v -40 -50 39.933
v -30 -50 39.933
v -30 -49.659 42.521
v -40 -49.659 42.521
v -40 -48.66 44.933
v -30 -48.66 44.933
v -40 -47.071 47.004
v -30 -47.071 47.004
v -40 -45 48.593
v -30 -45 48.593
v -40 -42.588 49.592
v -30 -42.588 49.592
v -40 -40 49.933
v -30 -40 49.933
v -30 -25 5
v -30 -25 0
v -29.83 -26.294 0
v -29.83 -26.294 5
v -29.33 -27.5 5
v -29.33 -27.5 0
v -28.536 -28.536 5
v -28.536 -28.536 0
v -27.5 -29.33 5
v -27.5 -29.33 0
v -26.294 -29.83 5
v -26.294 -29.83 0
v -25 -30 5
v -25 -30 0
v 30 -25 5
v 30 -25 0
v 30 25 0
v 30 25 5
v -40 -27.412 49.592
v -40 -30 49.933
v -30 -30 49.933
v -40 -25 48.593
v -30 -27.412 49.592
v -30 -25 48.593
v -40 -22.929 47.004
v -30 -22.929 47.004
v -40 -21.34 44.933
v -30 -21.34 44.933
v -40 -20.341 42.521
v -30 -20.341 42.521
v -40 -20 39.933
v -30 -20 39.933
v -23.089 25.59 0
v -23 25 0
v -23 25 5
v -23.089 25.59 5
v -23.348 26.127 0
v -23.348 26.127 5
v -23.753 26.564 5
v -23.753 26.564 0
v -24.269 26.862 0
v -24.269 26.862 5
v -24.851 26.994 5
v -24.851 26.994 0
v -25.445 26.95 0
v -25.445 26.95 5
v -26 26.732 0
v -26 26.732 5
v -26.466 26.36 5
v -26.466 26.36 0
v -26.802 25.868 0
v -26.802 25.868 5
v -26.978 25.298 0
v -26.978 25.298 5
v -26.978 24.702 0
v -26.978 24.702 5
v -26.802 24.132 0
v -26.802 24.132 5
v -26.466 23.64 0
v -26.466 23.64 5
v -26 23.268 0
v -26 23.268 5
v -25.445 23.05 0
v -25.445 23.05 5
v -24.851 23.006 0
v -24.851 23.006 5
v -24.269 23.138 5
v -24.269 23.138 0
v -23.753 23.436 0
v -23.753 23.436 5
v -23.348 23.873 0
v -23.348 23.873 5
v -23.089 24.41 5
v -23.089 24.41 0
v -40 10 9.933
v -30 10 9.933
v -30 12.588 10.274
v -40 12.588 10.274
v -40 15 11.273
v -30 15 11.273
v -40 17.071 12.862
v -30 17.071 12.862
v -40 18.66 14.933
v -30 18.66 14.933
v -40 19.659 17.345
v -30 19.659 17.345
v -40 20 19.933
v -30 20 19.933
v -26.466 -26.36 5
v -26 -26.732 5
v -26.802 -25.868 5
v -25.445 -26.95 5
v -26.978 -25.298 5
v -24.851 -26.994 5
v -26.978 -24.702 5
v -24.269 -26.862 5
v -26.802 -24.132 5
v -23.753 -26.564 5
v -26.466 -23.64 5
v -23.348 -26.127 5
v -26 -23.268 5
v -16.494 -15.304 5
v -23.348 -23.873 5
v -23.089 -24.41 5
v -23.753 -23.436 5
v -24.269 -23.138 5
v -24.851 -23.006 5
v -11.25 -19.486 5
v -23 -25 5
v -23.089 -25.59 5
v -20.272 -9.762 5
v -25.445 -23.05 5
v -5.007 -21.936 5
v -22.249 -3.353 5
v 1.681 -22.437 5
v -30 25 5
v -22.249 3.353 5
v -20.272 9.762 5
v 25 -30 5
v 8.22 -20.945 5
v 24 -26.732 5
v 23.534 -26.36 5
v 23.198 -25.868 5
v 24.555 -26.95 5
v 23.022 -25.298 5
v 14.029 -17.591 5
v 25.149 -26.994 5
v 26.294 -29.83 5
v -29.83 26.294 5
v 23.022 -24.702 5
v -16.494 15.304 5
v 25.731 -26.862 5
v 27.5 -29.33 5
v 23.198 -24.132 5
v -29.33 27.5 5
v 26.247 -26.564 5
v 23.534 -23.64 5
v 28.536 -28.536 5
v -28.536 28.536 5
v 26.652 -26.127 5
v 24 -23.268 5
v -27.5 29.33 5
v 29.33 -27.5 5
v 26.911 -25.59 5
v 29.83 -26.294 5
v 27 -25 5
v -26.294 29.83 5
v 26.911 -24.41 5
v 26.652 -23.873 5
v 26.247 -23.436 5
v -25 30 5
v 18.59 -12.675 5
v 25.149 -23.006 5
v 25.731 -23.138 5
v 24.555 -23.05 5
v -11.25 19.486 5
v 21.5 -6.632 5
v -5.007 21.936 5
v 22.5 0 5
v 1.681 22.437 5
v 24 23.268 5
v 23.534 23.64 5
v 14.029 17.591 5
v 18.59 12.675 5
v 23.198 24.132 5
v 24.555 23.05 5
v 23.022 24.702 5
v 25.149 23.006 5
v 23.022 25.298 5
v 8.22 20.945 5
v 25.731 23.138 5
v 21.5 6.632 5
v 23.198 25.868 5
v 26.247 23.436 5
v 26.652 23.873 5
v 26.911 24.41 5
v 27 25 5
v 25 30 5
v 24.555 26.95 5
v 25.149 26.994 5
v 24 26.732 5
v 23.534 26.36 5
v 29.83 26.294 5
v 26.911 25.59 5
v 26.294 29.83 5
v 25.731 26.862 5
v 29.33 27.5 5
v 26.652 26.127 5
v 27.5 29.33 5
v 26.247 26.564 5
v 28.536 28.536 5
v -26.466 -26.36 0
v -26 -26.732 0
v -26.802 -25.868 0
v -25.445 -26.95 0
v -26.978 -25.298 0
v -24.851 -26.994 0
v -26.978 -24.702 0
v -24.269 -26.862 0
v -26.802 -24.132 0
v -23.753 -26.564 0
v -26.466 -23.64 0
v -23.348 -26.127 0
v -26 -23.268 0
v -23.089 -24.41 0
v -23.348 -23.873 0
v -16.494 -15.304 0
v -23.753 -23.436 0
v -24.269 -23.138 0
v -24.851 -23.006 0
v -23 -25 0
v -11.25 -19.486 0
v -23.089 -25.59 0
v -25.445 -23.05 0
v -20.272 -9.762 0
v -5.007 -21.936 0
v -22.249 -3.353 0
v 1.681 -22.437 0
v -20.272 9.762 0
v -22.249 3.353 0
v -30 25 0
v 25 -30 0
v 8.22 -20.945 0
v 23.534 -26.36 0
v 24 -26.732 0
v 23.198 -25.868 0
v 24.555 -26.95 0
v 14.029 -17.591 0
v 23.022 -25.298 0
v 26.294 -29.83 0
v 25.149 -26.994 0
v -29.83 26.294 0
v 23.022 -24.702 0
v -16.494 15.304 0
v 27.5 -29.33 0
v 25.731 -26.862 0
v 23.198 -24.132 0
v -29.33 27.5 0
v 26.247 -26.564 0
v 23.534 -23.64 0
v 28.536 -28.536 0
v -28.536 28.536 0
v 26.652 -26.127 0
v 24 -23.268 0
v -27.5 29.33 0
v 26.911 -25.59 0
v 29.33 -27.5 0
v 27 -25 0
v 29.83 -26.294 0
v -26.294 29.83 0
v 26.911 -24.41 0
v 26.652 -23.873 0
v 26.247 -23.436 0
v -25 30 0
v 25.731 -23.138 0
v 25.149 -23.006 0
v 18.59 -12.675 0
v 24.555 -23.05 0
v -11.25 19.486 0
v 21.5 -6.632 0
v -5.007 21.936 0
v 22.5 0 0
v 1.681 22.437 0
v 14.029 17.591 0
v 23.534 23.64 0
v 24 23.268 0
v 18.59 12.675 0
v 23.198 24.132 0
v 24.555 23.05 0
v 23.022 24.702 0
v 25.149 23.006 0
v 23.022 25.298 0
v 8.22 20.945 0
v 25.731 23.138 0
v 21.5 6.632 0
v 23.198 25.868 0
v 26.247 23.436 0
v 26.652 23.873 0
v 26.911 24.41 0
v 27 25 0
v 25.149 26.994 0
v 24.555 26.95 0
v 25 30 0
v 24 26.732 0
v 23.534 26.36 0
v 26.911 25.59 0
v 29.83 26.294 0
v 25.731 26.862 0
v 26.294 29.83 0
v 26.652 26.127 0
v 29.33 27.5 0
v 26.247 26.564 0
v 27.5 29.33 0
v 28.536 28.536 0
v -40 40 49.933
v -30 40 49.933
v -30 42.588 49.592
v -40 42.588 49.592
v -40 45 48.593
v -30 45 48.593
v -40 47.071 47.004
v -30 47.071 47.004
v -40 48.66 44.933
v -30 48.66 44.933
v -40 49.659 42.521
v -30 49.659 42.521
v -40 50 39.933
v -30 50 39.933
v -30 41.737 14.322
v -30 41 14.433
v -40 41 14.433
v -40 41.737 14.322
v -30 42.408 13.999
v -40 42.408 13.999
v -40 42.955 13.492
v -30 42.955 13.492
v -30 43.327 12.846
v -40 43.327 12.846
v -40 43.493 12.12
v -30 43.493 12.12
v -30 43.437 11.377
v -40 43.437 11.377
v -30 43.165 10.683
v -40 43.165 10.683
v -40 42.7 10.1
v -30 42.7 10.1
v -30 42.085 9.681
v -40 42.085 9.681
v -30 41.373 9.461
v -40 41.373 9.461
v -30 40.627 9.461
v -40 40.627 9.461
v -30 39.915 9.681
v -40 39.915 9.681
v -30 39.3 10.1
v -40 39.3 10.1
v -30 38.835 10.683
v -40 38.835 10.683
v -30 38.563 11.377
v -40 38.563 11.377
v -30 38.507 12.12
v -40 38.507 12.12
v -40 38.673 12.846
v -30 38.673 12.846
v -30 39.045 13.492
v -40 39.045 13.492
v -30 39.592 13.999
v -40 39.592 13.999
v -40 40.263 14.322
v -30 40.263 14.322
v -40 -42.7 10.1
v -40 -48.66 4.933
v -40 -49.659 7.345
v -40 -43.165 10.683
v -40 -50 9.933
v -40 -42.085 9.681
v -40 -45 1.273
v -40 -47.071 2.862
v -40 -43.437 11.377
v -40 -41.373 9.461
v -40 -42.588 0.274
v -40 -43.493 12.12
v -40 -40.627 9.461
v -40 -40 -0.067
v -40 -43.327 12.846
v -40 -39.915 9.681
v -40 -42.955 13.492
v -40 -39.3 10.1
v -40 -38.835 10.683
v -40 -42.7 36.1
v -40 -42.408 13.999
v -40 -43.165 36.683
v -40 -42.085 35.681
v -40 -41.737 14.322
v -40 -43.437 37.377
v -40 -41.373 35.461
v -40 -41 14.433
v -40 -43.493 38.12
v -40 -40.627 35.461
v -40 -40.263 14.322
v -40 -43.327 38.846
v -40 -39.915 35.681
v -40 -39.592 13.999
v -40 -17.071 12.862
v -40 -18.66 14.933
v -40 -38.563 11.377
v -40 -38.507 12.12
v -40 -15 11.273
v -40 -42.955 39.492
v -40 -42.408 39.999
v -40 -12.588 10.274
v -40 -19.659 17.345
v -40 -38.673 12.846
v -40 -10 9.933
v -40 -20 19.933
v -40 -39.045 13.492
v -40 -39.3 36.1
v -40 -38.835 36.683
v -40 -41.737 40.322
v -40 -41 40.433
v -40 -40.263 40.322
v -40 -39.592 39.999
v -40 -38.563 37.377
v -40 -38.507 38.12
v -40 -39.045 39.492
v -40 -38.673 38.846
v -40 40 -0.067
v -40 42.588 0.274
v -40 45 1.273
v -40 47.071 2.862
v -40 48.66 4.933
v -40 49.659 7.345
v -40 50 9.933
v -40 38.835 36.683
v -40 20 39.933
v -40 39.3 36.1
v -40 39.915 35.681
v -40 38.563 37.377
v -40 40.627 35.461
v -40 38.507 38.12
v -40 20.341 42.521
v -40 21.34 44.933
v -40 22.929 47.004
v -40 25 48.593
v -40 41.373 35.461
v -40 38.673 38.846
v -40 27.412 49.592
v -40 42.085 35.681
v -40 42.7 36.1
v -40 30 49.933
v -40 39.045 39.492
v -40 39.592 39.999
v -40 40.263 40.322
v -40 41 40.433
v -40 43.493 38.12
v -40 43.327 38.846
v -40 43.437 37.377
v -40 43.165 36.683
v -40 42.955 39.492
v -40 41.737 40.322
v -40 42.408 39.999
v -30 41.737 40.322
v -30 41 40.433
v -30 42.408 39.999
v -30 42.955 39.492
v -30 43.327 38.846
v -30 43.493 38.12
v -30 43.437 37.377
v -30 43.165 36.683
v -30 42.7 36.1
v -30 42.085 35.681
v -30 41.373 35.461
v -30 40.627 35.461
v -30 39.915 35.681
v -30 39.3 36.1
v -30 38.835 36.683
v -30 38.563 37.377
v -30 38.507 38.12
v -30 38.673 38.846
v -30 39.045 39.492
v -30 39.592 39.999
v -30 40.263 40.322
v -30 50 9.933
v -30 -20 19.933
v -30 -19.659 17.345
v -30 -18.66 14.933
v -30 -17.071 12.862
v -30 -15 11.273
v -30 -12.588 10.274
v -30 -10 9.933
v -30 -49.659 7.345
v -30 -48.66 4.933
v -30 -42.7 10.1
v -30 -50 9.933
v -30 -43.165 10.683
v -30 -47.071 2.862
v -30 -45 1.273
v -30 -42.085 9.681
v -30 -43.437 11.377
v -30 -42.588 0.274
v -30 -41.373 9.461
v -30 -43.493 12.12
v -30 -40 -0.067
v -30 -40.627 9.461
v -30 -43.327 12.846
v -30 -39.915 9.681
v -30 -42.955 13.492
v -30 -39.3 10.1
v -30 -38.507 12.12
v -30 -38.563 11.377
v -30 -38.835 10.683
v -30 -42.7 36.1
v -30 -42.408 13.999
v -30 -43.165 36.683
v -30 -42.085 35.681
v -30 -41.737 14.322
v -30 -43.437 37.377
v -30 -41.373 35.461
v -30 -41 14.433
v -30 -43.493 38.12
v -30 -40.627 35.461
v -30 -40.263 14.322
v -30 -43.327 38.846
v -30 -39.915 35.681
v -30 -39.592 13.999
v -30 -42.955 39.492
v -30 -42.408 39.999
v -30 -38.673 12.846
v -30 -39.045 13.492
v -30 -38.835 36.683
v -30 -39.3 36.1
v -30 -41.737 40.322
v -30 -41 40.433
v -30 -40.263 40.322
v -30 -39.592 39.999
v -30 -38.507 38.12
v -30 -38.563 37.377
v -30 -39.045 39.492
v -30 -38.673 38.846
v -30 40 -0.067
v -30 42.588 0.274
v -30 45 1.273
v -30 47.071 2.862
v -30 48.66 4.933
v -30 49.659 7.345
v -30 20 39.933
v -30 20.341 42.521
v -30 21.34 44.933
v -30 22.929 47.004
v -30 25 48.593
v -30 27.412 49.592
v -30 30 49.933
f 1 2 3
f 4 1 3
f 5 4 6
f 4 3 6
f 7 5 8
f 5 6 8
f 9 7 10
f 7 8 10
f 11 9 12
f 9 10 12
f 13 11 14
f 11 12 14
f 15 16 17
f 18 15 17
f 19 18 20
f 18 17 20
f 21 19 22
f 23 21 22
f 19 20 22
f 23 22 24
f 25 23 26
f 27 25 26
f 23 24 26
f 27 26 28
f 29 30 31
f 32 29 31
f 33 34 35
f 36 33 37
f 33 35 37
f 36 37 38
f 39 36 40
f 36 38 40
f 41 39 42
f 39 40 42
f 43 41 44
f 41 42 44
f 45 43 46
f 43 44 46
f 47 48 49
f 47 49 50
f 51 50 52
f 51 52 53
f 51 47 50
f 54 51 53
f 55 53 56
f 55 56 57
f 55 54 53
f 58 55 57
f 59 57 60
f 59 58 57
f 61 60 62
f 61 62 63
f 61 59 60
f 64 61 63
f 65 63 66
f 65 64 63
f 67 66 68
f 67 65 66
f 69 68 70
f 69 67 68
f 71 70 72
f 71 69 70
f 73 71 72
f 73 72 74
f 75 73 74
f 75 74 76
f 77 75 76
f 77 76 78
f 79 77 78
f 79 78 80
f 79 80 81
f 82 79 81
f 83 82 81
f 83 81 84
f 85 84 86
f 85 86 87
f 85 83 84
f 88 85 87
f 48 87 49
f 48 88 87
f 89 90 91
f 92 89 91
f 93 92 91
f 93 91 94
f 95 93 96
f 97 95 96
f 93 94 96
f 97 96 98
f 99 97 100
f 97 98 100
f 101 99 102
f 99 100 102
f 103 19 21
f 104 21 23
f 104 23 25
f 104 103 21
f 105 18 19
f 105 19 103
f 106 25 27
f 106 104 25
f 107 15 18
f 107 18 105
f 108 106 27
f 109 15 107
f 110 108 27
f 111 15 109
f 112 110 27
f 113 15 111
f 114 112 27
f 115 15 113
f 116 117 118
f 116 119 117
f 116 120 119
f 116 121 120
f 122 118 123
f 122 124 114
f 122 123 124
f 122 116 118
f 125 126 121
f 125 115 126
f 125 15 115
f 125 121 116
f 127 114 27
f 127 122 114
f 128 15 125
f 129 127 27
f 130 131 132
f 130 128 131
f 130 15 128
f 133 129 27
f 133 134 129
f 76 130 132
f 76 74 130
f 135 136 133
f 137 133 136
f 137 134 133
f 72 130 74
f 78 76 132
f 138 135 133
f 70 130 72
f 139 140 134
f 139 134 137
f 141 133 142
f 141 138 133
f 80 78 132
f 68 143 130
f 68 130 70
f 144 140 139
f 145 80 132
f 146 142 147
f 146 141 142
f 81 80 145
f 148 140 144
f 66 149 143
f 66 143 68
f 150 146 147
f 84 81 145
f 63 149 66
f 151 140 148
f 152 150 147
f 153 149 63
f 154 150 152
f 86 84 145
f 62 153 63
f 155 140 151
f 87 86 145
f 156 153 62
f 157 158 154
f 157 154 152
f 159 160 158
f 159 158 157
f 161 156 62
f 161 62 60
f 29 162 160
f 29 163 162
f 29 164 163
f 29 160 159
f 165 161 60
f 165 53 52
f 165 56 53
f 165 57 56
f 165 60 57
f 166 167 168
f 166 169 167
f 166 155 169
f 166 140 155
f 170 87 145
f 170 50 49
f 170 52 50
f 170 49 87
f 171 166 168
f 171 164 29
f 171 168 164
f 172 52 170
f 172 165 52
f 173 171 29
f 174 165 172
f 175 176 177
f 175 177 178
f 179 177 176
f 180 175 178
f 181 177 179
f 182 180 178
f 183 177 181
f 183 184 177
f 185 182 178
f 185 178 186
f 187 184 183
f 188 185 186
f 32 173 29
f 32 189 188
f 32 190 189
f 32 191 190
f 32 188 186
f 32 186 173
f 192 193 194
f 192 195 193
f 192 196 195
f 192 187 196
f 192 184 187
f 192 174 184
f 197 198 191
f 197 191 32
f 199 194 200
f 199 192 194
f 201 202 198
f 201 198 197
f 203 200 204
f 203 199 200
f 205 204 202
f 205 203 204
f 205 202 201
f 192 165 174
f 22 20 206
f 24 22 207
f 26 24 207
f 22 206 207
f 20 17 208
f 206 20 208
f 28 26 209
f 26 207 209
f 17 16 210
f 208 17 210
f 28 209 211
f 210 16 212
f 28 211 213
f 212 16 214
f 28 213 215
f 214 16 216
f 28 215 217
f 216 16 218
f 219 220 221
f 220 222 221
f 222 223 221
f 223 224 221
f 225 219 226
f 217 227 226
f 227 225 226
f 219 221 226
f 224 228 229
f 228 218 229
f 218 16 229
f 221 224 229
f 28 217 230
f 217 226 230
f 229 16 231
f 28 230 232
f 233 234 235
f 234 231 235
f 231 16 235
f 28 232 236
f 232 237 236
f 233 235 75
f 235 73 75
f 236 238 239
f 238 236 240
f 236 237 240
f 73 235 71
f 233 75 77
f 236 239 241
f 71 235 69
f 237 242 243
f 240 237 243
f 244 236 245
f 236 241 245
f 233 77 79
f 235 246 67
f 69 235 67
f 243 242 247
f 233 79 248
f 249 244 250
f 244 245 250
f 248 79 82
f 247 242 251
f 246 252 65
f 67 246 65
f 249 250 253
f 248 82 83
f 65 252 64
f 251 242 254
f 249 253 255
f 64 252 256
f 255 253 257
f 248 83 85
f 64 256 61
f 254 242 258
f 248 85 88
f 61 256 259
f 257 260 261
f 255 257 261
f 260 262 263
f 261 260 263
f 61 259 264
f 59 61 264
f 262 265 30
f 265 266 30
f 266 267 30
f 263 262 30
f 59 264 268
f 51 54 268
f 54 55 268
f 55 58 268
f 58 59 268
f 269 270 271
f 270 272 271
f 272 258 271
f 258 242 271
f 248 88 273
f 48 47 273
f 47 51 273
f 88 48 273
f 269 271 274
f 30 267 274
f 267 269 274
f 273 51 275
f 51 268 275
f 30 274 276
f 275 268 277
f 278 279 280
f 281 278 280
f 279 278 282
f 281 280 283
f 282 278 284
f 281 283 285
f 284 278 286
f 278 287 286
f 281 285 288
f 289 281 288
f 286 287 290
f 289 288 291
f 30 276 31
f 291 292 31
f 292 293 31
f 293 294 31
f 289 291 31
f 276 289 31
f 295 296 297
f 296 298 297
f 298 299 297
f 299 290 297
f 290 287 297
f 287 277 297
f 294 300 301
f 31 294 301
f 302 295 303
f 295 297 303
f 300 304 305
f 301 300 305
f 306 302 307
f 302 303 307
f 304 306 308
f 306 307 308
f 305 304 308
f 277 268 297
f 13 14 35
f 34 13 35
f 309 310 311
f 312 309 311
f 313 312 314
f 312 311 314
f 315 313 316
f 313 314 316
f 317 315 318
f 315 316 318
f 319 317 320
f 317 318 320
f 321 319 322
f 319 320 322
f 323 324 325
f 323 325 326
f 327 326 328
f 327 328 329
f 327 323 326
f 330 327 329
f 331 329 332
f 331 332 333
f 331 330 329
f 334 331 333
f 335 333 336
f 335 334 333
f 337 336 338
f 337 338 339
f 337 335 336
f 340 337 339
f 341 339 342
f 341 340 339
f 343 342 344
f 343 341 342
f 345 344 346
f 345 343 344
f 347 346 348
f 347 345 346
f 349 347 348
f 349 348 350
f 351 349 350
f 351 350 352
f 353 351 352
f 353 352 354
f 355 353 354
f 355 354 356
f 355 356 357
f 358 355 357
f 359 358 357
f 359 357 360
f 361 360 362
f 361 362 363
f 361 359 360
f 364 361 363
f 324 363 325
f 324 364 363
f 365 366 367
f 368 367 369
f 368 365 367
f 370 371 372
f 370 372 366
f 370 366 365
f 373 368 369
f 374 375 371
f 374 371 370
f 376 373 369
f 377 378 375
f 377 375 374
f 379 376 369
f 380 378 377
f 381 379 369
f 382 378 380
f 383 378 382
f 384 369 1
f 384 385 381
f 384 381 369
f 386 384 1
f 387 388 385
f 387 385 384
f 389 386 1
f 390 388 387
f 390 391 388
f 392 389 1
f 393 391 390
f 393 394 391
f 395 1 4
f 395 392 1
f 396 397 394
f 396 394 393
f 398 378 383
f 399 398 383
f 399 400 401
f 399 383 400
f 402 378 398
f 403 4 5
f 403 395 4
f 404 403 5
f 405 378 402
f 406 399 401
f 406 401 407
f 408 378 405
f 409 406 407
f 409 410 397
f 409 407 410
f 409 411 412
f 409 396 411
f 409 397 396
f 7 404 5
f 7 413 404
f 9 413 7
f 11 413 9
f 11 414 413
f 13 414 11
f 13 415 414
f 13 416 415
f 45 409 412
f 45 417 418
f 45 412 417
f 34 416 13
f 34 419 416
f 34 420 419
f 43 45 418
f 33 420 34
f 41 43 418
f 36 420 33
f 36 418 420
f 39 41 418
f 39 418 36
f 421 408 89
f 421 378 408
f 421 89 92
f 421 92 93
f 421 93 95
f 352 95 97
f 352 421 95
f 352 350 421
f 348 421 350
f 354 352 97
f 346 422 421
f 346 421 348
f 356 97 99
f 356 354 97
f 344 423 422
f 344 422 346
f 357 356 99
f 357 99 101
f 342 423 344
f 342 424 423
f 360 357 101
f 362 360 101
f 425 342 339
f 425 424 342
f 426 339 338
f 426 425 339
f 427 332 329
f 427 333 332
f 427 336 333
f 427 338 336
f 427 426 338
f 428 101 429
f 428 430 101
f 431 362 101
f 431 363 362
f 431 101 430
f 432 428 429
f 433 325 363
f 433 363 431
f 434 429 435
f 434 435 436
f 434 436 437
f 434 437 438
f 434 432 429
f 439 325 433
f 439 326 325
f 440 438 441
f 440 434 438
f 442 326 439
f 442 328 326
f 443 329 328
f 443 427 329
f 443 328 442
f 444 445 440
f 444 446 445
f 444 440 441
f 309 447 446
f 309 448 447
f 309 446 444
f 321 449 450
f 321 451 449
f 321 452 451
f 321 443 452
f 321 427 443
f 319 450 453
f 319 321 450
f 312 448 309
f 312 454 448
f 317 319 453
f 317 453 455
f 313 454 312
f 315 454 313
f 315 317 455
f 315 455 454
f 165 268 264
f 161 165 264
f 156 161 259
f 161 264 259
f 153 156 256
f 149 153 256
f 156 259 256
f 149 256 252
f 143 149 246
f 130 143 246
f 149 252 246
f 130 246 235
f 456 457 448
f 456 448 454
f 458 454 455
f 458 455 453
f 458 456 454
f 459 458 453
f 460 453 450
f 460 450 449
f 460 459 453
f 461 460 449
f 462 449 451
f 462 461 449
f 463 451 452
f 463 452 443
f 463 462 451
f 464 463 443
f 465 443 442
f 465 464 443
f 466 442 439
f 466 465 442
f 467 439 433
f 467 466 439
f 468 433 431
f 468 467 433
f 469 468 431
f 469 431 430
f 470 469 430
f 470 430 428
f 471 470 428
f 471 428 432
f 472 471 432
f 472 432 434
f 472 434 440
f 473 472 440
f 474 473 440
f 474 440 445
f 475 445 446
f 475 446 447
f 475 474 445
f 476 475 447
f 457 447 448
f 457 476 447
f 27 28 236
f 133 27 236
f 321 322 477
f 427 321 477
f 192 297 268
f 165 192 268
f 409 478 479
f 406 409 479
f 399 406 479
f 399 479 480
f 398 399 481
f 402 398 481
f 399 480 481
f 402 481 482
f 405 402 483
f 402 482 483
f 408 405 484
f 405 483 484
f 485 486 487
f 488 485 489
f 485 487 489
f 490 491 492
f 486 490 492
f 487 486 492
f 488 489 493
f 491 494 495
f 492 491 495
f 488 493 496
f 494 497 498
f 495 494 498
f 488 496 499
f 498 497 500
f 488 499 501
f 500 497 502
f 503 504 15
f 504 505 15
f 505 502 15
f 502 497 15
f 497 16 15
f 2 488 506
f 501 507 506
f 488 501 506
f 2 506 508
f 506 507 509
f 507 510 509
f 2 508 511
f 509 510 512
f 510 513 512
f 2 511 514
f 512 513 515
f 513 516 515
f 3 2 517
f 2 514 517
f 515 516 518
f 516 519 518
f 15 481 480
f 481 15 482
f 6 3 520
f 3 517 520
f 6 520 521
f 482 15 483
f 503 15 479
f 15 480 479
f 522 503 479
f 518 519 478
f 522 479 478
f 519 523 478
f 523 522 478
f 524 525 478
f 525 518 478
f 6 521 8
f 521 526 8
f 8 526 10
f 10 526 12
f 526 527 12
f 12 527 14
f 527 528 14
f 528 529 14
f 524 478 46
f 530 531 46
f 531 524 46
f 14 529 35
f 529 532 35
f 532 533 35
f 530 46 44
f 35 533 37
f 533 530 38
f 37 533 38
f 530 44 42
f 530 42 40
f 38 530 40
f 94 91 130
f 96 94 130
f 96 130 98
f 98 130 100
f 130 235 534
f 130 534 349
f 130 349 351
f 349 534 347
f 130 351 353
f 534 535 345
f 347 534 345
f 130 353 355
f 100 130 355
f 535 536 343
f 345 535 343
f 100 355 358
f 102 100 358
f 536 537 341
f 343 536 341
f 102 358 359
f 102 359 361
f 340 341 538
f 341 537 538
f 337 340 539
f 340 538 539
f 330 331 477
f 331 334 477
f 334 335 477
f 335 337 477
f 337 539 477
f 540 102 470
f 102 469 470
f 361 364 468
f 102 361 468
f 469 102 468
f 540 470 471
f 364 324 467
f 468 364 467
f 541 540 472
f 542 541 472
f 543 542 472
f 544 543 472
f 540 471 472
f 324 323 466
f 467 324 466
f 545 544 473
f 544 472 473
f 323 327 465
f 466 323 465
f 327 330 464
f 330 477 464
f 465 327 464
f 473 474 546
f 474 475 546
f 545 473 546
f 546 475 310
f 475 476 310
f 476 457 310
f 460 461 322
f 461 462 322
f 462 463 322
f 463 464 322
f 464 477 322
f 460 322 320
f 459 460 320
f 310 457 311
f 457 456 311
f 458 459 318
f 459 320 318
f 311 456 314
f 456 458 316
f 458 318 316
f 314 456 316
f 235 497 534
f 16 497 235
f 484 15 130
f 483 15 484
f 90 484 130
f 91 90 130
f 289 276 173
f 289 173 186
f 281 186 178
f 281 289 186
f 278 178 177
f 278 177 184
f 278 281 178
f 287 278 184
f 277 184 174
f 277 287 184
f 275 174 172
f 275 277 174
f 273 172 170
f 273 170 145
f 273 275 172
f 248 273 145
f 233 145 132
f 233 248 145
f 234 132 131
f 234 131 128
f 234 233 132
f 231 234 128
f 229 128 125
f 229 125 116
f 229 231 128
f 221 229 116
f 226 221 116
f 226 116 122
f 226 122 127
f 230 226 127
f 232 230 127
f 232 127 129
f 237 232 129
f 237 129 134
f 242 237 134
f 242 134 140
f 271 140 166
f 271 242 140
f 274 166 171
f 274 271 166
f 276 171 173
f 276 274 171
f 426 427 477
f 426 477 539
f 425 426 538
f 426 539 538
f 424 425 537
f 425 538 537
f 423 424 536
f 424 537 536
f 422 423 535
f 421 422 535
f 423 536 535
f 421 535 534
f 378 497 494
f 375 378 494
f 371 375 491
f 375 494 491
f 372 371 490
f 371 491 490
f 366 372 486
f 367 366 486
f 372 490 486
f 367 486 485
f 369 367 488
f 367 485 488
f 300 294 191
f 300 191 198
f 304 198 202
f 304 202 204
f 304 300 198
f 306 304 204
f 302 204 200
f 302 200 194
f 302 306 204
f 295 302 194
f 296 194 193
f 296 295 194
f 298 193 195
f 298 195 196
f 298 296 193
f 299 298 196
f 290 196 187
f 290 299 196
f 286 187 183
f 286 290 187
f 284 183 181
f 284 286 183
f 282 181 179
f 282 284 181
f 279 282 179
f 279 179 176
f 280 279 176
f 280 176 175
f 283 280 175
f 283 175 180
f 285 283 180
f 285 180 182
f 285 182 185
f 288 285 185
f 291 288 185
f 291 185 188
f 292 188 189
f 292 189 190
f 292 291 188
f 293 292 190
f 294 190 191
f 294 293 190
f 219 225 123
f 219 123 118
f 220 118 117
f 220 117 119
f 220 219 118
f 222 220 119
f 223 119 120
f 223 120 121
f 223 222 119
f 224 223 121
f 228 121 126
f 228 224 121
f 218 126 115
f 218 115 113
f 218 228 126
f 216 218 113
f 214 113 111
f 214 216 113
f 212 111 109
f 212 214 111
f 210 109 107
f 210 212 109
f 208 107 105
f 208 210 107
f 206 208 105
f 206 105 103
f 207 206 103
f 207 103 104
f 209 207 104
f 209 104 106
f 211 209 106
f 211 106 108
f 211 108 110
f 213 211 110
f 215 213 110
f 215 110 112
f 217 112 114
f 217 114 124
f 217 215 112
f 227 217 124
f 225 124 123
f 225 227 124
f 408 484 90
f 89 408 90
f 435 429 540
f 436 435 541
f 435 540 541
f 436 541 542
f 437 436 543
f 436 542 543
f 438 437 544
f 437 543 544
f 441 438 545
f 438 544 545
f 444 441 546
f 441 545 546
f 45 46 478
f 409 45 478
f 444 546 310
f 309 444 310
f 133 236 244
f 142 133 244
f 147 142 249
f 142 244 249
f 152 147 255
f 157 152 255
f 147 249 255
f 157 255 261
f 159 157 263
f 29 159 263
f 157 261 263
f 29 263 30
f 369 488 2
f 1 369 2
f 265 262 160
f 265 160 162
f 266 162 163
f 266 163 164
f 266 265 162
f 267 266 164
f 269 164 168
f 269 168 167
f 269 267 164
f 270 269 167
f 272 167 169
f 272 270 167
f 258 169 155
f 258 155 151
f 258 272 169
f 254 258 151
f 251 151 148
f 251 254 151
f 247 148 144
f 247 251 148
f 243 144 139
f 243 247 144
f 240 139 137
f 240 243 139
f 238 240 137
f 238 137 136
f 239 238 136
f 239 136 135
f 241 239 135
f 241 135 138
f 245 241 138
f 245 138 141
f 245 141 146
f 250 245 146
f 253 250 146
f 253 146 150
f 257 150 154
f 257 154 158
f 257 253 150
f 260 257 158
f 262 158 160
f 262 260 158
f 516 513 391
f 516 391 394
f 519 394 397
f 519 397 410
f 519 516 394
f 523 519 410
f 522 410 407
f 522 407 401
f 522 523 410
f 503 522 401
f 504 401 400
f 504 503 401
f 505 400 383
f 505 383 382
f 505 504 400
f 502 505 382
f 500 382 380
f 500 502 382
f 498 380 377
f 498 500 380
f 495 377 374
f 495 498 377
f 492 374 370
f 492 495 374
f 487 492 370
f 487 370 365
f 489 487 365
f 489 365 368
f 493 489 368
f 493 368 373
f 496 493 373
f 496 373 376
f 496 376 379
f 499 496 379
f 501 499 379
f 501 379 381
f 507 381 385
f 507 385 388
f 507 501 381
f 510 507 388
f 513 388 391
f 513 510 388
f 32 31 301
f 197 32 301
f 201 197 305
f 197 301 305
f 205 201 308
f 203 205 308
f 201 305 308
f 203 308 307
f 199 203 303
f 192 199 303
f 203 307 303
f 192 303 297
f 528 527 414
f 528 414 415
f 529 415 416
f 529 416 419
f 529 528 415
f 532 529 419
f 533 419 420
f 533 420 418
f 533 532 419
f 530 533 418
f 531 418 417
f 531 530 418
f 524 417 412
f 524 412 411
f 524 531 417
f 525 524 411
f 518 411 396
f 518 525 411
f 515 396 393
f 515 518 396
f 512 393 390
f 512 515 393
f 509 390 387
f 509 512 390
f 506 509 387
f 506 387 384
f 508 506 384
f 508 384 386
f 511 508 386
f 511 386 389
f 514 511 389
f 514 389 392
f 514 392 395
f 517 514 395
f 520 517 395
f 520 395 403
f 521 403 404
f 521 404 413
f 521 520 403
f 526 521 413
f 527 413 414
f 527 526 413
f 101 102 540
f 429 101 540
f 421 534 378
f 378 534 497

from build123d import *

# Parameters (mm, degrees)
SKETCH2_R           = 2
SKETCH2_R_2         = 22.5
BOSS_EXTRUDE2_DEPTH = 5
SKETCH3_R           = 2.5
BOSS_EXTRUDE3_DEPTH = 10


with BuildPart() as part:
    # Sketch2 → Boss-Extrude2 (new body)
    with BuildSketch(Plane.XY):
        with BuildLine():
            Line((25, 30), (-25, 30))
            ThreePointArc((-25, 30), (-28.535533906, 28.535533906), (-30, 25))
            Line((-30, 25), (-30, -25))
            ThreePointArc((-30, -25), (-28.535533906, -28.535533906), (-25, -30))
            Line((-25, -30), (25, -30))
            ThreePointArc((25, -30), (28.535533906, -28.535533906), (30, -25))
            Line((30, -25), (30, 25))
            ThreePointArc((30, 25), (28.535533906, 28.535533906), (25, 30))
        make_face()
        with Locations((-25, 25)):
            Circle(SKETCH2_R, mode=Mode.SUBTRACT)
        with Locations((25, 25)):
            Circle(SKETCH2_R, mode=Mode.SUBTRACT)
        with Locations((25, -25)):
            Circle(SKETCH2_R, mode=Mode.SUBTRACT)
        with Locations((-25, -25)):
            Circle(SKETCH2_R, mode=Mode.SUBTRACT)
        Circle(SKETCH2_R_2, mode=Mode.SUBTRACT)
    extrude(amount=BOSS_EXTRUDE2_DEPTH)

    # Sketch3 → Boss-Extrude3 (add)
    with BuildSketch(Plane.ZY.offset(30)):
        with BuildLine():
            Line((39.932932244, 50), (9.932932244, 50))
            ThreePointArc((9.932932244, 50), (2.861864432, 47.071067812), (-0.067067756, 40))
            Line((-0.067067756, 40), (-0.067067756, -40))
            ThreePointArc((-0.067067756, -40), (2.861864432, -47.071067812), (9.932932244, -50))
            Line((9.932932244, -50), (39.932932244, -50))
            ThreePointArc((39.932932244, -50), (47.004000055, -47.071067812), (49.932932244, -40))
            Line((49.932932244, -40), (49.932932244, -30))
            ThreePointArc((49.932932244, -30), (47.004000055, -22.928932188), (39.932932244, -20))
            Line((39.932932244, -20), (19.932932244, -20))
            ThreePointArc((19.932932244, -20), (12.861864432, -17.071067812), (9.932932244, -10))
            Line((9.932932244, -10), (9.932932244, 10))
            ThreePointArc((9.932932244, 10), (12.861864432, 17.071067812), (19.932932244, 20))
            Line((19.932932244, 20), (39.932932244, 20))
            ThreePointArc((39.932932244, 20), (47.004000055, 22.928932188), (49.932932244, 30))
            Line((49.932932244, 30), (49.932932244, 40))
            ThreePointArc((49.932932244, 40), (47.004000055, 47.071067812), (39.932932244, 50))
        make_face()
        with Locations((11.932932244, -41)):
            Circle(SKETCH3_R, mode=Mode.SUBTRACT)
        with Locations((37.932932244, -41)):
            Circle(SKETCH3_R, mode=Mode.SUBTRACT)
        with Locations((11.932932244, 41)):
            Circle(SKETCH3_R, mode=Mode.SUBTRACT)
        with Locations((37.932932244, 41)):
            Circle(SKETCH3_R, mode=Mode.SUBTRACT)
    extrude(amount=BOSS_EXTRUDE3_DEPTH)


solid = part.part
